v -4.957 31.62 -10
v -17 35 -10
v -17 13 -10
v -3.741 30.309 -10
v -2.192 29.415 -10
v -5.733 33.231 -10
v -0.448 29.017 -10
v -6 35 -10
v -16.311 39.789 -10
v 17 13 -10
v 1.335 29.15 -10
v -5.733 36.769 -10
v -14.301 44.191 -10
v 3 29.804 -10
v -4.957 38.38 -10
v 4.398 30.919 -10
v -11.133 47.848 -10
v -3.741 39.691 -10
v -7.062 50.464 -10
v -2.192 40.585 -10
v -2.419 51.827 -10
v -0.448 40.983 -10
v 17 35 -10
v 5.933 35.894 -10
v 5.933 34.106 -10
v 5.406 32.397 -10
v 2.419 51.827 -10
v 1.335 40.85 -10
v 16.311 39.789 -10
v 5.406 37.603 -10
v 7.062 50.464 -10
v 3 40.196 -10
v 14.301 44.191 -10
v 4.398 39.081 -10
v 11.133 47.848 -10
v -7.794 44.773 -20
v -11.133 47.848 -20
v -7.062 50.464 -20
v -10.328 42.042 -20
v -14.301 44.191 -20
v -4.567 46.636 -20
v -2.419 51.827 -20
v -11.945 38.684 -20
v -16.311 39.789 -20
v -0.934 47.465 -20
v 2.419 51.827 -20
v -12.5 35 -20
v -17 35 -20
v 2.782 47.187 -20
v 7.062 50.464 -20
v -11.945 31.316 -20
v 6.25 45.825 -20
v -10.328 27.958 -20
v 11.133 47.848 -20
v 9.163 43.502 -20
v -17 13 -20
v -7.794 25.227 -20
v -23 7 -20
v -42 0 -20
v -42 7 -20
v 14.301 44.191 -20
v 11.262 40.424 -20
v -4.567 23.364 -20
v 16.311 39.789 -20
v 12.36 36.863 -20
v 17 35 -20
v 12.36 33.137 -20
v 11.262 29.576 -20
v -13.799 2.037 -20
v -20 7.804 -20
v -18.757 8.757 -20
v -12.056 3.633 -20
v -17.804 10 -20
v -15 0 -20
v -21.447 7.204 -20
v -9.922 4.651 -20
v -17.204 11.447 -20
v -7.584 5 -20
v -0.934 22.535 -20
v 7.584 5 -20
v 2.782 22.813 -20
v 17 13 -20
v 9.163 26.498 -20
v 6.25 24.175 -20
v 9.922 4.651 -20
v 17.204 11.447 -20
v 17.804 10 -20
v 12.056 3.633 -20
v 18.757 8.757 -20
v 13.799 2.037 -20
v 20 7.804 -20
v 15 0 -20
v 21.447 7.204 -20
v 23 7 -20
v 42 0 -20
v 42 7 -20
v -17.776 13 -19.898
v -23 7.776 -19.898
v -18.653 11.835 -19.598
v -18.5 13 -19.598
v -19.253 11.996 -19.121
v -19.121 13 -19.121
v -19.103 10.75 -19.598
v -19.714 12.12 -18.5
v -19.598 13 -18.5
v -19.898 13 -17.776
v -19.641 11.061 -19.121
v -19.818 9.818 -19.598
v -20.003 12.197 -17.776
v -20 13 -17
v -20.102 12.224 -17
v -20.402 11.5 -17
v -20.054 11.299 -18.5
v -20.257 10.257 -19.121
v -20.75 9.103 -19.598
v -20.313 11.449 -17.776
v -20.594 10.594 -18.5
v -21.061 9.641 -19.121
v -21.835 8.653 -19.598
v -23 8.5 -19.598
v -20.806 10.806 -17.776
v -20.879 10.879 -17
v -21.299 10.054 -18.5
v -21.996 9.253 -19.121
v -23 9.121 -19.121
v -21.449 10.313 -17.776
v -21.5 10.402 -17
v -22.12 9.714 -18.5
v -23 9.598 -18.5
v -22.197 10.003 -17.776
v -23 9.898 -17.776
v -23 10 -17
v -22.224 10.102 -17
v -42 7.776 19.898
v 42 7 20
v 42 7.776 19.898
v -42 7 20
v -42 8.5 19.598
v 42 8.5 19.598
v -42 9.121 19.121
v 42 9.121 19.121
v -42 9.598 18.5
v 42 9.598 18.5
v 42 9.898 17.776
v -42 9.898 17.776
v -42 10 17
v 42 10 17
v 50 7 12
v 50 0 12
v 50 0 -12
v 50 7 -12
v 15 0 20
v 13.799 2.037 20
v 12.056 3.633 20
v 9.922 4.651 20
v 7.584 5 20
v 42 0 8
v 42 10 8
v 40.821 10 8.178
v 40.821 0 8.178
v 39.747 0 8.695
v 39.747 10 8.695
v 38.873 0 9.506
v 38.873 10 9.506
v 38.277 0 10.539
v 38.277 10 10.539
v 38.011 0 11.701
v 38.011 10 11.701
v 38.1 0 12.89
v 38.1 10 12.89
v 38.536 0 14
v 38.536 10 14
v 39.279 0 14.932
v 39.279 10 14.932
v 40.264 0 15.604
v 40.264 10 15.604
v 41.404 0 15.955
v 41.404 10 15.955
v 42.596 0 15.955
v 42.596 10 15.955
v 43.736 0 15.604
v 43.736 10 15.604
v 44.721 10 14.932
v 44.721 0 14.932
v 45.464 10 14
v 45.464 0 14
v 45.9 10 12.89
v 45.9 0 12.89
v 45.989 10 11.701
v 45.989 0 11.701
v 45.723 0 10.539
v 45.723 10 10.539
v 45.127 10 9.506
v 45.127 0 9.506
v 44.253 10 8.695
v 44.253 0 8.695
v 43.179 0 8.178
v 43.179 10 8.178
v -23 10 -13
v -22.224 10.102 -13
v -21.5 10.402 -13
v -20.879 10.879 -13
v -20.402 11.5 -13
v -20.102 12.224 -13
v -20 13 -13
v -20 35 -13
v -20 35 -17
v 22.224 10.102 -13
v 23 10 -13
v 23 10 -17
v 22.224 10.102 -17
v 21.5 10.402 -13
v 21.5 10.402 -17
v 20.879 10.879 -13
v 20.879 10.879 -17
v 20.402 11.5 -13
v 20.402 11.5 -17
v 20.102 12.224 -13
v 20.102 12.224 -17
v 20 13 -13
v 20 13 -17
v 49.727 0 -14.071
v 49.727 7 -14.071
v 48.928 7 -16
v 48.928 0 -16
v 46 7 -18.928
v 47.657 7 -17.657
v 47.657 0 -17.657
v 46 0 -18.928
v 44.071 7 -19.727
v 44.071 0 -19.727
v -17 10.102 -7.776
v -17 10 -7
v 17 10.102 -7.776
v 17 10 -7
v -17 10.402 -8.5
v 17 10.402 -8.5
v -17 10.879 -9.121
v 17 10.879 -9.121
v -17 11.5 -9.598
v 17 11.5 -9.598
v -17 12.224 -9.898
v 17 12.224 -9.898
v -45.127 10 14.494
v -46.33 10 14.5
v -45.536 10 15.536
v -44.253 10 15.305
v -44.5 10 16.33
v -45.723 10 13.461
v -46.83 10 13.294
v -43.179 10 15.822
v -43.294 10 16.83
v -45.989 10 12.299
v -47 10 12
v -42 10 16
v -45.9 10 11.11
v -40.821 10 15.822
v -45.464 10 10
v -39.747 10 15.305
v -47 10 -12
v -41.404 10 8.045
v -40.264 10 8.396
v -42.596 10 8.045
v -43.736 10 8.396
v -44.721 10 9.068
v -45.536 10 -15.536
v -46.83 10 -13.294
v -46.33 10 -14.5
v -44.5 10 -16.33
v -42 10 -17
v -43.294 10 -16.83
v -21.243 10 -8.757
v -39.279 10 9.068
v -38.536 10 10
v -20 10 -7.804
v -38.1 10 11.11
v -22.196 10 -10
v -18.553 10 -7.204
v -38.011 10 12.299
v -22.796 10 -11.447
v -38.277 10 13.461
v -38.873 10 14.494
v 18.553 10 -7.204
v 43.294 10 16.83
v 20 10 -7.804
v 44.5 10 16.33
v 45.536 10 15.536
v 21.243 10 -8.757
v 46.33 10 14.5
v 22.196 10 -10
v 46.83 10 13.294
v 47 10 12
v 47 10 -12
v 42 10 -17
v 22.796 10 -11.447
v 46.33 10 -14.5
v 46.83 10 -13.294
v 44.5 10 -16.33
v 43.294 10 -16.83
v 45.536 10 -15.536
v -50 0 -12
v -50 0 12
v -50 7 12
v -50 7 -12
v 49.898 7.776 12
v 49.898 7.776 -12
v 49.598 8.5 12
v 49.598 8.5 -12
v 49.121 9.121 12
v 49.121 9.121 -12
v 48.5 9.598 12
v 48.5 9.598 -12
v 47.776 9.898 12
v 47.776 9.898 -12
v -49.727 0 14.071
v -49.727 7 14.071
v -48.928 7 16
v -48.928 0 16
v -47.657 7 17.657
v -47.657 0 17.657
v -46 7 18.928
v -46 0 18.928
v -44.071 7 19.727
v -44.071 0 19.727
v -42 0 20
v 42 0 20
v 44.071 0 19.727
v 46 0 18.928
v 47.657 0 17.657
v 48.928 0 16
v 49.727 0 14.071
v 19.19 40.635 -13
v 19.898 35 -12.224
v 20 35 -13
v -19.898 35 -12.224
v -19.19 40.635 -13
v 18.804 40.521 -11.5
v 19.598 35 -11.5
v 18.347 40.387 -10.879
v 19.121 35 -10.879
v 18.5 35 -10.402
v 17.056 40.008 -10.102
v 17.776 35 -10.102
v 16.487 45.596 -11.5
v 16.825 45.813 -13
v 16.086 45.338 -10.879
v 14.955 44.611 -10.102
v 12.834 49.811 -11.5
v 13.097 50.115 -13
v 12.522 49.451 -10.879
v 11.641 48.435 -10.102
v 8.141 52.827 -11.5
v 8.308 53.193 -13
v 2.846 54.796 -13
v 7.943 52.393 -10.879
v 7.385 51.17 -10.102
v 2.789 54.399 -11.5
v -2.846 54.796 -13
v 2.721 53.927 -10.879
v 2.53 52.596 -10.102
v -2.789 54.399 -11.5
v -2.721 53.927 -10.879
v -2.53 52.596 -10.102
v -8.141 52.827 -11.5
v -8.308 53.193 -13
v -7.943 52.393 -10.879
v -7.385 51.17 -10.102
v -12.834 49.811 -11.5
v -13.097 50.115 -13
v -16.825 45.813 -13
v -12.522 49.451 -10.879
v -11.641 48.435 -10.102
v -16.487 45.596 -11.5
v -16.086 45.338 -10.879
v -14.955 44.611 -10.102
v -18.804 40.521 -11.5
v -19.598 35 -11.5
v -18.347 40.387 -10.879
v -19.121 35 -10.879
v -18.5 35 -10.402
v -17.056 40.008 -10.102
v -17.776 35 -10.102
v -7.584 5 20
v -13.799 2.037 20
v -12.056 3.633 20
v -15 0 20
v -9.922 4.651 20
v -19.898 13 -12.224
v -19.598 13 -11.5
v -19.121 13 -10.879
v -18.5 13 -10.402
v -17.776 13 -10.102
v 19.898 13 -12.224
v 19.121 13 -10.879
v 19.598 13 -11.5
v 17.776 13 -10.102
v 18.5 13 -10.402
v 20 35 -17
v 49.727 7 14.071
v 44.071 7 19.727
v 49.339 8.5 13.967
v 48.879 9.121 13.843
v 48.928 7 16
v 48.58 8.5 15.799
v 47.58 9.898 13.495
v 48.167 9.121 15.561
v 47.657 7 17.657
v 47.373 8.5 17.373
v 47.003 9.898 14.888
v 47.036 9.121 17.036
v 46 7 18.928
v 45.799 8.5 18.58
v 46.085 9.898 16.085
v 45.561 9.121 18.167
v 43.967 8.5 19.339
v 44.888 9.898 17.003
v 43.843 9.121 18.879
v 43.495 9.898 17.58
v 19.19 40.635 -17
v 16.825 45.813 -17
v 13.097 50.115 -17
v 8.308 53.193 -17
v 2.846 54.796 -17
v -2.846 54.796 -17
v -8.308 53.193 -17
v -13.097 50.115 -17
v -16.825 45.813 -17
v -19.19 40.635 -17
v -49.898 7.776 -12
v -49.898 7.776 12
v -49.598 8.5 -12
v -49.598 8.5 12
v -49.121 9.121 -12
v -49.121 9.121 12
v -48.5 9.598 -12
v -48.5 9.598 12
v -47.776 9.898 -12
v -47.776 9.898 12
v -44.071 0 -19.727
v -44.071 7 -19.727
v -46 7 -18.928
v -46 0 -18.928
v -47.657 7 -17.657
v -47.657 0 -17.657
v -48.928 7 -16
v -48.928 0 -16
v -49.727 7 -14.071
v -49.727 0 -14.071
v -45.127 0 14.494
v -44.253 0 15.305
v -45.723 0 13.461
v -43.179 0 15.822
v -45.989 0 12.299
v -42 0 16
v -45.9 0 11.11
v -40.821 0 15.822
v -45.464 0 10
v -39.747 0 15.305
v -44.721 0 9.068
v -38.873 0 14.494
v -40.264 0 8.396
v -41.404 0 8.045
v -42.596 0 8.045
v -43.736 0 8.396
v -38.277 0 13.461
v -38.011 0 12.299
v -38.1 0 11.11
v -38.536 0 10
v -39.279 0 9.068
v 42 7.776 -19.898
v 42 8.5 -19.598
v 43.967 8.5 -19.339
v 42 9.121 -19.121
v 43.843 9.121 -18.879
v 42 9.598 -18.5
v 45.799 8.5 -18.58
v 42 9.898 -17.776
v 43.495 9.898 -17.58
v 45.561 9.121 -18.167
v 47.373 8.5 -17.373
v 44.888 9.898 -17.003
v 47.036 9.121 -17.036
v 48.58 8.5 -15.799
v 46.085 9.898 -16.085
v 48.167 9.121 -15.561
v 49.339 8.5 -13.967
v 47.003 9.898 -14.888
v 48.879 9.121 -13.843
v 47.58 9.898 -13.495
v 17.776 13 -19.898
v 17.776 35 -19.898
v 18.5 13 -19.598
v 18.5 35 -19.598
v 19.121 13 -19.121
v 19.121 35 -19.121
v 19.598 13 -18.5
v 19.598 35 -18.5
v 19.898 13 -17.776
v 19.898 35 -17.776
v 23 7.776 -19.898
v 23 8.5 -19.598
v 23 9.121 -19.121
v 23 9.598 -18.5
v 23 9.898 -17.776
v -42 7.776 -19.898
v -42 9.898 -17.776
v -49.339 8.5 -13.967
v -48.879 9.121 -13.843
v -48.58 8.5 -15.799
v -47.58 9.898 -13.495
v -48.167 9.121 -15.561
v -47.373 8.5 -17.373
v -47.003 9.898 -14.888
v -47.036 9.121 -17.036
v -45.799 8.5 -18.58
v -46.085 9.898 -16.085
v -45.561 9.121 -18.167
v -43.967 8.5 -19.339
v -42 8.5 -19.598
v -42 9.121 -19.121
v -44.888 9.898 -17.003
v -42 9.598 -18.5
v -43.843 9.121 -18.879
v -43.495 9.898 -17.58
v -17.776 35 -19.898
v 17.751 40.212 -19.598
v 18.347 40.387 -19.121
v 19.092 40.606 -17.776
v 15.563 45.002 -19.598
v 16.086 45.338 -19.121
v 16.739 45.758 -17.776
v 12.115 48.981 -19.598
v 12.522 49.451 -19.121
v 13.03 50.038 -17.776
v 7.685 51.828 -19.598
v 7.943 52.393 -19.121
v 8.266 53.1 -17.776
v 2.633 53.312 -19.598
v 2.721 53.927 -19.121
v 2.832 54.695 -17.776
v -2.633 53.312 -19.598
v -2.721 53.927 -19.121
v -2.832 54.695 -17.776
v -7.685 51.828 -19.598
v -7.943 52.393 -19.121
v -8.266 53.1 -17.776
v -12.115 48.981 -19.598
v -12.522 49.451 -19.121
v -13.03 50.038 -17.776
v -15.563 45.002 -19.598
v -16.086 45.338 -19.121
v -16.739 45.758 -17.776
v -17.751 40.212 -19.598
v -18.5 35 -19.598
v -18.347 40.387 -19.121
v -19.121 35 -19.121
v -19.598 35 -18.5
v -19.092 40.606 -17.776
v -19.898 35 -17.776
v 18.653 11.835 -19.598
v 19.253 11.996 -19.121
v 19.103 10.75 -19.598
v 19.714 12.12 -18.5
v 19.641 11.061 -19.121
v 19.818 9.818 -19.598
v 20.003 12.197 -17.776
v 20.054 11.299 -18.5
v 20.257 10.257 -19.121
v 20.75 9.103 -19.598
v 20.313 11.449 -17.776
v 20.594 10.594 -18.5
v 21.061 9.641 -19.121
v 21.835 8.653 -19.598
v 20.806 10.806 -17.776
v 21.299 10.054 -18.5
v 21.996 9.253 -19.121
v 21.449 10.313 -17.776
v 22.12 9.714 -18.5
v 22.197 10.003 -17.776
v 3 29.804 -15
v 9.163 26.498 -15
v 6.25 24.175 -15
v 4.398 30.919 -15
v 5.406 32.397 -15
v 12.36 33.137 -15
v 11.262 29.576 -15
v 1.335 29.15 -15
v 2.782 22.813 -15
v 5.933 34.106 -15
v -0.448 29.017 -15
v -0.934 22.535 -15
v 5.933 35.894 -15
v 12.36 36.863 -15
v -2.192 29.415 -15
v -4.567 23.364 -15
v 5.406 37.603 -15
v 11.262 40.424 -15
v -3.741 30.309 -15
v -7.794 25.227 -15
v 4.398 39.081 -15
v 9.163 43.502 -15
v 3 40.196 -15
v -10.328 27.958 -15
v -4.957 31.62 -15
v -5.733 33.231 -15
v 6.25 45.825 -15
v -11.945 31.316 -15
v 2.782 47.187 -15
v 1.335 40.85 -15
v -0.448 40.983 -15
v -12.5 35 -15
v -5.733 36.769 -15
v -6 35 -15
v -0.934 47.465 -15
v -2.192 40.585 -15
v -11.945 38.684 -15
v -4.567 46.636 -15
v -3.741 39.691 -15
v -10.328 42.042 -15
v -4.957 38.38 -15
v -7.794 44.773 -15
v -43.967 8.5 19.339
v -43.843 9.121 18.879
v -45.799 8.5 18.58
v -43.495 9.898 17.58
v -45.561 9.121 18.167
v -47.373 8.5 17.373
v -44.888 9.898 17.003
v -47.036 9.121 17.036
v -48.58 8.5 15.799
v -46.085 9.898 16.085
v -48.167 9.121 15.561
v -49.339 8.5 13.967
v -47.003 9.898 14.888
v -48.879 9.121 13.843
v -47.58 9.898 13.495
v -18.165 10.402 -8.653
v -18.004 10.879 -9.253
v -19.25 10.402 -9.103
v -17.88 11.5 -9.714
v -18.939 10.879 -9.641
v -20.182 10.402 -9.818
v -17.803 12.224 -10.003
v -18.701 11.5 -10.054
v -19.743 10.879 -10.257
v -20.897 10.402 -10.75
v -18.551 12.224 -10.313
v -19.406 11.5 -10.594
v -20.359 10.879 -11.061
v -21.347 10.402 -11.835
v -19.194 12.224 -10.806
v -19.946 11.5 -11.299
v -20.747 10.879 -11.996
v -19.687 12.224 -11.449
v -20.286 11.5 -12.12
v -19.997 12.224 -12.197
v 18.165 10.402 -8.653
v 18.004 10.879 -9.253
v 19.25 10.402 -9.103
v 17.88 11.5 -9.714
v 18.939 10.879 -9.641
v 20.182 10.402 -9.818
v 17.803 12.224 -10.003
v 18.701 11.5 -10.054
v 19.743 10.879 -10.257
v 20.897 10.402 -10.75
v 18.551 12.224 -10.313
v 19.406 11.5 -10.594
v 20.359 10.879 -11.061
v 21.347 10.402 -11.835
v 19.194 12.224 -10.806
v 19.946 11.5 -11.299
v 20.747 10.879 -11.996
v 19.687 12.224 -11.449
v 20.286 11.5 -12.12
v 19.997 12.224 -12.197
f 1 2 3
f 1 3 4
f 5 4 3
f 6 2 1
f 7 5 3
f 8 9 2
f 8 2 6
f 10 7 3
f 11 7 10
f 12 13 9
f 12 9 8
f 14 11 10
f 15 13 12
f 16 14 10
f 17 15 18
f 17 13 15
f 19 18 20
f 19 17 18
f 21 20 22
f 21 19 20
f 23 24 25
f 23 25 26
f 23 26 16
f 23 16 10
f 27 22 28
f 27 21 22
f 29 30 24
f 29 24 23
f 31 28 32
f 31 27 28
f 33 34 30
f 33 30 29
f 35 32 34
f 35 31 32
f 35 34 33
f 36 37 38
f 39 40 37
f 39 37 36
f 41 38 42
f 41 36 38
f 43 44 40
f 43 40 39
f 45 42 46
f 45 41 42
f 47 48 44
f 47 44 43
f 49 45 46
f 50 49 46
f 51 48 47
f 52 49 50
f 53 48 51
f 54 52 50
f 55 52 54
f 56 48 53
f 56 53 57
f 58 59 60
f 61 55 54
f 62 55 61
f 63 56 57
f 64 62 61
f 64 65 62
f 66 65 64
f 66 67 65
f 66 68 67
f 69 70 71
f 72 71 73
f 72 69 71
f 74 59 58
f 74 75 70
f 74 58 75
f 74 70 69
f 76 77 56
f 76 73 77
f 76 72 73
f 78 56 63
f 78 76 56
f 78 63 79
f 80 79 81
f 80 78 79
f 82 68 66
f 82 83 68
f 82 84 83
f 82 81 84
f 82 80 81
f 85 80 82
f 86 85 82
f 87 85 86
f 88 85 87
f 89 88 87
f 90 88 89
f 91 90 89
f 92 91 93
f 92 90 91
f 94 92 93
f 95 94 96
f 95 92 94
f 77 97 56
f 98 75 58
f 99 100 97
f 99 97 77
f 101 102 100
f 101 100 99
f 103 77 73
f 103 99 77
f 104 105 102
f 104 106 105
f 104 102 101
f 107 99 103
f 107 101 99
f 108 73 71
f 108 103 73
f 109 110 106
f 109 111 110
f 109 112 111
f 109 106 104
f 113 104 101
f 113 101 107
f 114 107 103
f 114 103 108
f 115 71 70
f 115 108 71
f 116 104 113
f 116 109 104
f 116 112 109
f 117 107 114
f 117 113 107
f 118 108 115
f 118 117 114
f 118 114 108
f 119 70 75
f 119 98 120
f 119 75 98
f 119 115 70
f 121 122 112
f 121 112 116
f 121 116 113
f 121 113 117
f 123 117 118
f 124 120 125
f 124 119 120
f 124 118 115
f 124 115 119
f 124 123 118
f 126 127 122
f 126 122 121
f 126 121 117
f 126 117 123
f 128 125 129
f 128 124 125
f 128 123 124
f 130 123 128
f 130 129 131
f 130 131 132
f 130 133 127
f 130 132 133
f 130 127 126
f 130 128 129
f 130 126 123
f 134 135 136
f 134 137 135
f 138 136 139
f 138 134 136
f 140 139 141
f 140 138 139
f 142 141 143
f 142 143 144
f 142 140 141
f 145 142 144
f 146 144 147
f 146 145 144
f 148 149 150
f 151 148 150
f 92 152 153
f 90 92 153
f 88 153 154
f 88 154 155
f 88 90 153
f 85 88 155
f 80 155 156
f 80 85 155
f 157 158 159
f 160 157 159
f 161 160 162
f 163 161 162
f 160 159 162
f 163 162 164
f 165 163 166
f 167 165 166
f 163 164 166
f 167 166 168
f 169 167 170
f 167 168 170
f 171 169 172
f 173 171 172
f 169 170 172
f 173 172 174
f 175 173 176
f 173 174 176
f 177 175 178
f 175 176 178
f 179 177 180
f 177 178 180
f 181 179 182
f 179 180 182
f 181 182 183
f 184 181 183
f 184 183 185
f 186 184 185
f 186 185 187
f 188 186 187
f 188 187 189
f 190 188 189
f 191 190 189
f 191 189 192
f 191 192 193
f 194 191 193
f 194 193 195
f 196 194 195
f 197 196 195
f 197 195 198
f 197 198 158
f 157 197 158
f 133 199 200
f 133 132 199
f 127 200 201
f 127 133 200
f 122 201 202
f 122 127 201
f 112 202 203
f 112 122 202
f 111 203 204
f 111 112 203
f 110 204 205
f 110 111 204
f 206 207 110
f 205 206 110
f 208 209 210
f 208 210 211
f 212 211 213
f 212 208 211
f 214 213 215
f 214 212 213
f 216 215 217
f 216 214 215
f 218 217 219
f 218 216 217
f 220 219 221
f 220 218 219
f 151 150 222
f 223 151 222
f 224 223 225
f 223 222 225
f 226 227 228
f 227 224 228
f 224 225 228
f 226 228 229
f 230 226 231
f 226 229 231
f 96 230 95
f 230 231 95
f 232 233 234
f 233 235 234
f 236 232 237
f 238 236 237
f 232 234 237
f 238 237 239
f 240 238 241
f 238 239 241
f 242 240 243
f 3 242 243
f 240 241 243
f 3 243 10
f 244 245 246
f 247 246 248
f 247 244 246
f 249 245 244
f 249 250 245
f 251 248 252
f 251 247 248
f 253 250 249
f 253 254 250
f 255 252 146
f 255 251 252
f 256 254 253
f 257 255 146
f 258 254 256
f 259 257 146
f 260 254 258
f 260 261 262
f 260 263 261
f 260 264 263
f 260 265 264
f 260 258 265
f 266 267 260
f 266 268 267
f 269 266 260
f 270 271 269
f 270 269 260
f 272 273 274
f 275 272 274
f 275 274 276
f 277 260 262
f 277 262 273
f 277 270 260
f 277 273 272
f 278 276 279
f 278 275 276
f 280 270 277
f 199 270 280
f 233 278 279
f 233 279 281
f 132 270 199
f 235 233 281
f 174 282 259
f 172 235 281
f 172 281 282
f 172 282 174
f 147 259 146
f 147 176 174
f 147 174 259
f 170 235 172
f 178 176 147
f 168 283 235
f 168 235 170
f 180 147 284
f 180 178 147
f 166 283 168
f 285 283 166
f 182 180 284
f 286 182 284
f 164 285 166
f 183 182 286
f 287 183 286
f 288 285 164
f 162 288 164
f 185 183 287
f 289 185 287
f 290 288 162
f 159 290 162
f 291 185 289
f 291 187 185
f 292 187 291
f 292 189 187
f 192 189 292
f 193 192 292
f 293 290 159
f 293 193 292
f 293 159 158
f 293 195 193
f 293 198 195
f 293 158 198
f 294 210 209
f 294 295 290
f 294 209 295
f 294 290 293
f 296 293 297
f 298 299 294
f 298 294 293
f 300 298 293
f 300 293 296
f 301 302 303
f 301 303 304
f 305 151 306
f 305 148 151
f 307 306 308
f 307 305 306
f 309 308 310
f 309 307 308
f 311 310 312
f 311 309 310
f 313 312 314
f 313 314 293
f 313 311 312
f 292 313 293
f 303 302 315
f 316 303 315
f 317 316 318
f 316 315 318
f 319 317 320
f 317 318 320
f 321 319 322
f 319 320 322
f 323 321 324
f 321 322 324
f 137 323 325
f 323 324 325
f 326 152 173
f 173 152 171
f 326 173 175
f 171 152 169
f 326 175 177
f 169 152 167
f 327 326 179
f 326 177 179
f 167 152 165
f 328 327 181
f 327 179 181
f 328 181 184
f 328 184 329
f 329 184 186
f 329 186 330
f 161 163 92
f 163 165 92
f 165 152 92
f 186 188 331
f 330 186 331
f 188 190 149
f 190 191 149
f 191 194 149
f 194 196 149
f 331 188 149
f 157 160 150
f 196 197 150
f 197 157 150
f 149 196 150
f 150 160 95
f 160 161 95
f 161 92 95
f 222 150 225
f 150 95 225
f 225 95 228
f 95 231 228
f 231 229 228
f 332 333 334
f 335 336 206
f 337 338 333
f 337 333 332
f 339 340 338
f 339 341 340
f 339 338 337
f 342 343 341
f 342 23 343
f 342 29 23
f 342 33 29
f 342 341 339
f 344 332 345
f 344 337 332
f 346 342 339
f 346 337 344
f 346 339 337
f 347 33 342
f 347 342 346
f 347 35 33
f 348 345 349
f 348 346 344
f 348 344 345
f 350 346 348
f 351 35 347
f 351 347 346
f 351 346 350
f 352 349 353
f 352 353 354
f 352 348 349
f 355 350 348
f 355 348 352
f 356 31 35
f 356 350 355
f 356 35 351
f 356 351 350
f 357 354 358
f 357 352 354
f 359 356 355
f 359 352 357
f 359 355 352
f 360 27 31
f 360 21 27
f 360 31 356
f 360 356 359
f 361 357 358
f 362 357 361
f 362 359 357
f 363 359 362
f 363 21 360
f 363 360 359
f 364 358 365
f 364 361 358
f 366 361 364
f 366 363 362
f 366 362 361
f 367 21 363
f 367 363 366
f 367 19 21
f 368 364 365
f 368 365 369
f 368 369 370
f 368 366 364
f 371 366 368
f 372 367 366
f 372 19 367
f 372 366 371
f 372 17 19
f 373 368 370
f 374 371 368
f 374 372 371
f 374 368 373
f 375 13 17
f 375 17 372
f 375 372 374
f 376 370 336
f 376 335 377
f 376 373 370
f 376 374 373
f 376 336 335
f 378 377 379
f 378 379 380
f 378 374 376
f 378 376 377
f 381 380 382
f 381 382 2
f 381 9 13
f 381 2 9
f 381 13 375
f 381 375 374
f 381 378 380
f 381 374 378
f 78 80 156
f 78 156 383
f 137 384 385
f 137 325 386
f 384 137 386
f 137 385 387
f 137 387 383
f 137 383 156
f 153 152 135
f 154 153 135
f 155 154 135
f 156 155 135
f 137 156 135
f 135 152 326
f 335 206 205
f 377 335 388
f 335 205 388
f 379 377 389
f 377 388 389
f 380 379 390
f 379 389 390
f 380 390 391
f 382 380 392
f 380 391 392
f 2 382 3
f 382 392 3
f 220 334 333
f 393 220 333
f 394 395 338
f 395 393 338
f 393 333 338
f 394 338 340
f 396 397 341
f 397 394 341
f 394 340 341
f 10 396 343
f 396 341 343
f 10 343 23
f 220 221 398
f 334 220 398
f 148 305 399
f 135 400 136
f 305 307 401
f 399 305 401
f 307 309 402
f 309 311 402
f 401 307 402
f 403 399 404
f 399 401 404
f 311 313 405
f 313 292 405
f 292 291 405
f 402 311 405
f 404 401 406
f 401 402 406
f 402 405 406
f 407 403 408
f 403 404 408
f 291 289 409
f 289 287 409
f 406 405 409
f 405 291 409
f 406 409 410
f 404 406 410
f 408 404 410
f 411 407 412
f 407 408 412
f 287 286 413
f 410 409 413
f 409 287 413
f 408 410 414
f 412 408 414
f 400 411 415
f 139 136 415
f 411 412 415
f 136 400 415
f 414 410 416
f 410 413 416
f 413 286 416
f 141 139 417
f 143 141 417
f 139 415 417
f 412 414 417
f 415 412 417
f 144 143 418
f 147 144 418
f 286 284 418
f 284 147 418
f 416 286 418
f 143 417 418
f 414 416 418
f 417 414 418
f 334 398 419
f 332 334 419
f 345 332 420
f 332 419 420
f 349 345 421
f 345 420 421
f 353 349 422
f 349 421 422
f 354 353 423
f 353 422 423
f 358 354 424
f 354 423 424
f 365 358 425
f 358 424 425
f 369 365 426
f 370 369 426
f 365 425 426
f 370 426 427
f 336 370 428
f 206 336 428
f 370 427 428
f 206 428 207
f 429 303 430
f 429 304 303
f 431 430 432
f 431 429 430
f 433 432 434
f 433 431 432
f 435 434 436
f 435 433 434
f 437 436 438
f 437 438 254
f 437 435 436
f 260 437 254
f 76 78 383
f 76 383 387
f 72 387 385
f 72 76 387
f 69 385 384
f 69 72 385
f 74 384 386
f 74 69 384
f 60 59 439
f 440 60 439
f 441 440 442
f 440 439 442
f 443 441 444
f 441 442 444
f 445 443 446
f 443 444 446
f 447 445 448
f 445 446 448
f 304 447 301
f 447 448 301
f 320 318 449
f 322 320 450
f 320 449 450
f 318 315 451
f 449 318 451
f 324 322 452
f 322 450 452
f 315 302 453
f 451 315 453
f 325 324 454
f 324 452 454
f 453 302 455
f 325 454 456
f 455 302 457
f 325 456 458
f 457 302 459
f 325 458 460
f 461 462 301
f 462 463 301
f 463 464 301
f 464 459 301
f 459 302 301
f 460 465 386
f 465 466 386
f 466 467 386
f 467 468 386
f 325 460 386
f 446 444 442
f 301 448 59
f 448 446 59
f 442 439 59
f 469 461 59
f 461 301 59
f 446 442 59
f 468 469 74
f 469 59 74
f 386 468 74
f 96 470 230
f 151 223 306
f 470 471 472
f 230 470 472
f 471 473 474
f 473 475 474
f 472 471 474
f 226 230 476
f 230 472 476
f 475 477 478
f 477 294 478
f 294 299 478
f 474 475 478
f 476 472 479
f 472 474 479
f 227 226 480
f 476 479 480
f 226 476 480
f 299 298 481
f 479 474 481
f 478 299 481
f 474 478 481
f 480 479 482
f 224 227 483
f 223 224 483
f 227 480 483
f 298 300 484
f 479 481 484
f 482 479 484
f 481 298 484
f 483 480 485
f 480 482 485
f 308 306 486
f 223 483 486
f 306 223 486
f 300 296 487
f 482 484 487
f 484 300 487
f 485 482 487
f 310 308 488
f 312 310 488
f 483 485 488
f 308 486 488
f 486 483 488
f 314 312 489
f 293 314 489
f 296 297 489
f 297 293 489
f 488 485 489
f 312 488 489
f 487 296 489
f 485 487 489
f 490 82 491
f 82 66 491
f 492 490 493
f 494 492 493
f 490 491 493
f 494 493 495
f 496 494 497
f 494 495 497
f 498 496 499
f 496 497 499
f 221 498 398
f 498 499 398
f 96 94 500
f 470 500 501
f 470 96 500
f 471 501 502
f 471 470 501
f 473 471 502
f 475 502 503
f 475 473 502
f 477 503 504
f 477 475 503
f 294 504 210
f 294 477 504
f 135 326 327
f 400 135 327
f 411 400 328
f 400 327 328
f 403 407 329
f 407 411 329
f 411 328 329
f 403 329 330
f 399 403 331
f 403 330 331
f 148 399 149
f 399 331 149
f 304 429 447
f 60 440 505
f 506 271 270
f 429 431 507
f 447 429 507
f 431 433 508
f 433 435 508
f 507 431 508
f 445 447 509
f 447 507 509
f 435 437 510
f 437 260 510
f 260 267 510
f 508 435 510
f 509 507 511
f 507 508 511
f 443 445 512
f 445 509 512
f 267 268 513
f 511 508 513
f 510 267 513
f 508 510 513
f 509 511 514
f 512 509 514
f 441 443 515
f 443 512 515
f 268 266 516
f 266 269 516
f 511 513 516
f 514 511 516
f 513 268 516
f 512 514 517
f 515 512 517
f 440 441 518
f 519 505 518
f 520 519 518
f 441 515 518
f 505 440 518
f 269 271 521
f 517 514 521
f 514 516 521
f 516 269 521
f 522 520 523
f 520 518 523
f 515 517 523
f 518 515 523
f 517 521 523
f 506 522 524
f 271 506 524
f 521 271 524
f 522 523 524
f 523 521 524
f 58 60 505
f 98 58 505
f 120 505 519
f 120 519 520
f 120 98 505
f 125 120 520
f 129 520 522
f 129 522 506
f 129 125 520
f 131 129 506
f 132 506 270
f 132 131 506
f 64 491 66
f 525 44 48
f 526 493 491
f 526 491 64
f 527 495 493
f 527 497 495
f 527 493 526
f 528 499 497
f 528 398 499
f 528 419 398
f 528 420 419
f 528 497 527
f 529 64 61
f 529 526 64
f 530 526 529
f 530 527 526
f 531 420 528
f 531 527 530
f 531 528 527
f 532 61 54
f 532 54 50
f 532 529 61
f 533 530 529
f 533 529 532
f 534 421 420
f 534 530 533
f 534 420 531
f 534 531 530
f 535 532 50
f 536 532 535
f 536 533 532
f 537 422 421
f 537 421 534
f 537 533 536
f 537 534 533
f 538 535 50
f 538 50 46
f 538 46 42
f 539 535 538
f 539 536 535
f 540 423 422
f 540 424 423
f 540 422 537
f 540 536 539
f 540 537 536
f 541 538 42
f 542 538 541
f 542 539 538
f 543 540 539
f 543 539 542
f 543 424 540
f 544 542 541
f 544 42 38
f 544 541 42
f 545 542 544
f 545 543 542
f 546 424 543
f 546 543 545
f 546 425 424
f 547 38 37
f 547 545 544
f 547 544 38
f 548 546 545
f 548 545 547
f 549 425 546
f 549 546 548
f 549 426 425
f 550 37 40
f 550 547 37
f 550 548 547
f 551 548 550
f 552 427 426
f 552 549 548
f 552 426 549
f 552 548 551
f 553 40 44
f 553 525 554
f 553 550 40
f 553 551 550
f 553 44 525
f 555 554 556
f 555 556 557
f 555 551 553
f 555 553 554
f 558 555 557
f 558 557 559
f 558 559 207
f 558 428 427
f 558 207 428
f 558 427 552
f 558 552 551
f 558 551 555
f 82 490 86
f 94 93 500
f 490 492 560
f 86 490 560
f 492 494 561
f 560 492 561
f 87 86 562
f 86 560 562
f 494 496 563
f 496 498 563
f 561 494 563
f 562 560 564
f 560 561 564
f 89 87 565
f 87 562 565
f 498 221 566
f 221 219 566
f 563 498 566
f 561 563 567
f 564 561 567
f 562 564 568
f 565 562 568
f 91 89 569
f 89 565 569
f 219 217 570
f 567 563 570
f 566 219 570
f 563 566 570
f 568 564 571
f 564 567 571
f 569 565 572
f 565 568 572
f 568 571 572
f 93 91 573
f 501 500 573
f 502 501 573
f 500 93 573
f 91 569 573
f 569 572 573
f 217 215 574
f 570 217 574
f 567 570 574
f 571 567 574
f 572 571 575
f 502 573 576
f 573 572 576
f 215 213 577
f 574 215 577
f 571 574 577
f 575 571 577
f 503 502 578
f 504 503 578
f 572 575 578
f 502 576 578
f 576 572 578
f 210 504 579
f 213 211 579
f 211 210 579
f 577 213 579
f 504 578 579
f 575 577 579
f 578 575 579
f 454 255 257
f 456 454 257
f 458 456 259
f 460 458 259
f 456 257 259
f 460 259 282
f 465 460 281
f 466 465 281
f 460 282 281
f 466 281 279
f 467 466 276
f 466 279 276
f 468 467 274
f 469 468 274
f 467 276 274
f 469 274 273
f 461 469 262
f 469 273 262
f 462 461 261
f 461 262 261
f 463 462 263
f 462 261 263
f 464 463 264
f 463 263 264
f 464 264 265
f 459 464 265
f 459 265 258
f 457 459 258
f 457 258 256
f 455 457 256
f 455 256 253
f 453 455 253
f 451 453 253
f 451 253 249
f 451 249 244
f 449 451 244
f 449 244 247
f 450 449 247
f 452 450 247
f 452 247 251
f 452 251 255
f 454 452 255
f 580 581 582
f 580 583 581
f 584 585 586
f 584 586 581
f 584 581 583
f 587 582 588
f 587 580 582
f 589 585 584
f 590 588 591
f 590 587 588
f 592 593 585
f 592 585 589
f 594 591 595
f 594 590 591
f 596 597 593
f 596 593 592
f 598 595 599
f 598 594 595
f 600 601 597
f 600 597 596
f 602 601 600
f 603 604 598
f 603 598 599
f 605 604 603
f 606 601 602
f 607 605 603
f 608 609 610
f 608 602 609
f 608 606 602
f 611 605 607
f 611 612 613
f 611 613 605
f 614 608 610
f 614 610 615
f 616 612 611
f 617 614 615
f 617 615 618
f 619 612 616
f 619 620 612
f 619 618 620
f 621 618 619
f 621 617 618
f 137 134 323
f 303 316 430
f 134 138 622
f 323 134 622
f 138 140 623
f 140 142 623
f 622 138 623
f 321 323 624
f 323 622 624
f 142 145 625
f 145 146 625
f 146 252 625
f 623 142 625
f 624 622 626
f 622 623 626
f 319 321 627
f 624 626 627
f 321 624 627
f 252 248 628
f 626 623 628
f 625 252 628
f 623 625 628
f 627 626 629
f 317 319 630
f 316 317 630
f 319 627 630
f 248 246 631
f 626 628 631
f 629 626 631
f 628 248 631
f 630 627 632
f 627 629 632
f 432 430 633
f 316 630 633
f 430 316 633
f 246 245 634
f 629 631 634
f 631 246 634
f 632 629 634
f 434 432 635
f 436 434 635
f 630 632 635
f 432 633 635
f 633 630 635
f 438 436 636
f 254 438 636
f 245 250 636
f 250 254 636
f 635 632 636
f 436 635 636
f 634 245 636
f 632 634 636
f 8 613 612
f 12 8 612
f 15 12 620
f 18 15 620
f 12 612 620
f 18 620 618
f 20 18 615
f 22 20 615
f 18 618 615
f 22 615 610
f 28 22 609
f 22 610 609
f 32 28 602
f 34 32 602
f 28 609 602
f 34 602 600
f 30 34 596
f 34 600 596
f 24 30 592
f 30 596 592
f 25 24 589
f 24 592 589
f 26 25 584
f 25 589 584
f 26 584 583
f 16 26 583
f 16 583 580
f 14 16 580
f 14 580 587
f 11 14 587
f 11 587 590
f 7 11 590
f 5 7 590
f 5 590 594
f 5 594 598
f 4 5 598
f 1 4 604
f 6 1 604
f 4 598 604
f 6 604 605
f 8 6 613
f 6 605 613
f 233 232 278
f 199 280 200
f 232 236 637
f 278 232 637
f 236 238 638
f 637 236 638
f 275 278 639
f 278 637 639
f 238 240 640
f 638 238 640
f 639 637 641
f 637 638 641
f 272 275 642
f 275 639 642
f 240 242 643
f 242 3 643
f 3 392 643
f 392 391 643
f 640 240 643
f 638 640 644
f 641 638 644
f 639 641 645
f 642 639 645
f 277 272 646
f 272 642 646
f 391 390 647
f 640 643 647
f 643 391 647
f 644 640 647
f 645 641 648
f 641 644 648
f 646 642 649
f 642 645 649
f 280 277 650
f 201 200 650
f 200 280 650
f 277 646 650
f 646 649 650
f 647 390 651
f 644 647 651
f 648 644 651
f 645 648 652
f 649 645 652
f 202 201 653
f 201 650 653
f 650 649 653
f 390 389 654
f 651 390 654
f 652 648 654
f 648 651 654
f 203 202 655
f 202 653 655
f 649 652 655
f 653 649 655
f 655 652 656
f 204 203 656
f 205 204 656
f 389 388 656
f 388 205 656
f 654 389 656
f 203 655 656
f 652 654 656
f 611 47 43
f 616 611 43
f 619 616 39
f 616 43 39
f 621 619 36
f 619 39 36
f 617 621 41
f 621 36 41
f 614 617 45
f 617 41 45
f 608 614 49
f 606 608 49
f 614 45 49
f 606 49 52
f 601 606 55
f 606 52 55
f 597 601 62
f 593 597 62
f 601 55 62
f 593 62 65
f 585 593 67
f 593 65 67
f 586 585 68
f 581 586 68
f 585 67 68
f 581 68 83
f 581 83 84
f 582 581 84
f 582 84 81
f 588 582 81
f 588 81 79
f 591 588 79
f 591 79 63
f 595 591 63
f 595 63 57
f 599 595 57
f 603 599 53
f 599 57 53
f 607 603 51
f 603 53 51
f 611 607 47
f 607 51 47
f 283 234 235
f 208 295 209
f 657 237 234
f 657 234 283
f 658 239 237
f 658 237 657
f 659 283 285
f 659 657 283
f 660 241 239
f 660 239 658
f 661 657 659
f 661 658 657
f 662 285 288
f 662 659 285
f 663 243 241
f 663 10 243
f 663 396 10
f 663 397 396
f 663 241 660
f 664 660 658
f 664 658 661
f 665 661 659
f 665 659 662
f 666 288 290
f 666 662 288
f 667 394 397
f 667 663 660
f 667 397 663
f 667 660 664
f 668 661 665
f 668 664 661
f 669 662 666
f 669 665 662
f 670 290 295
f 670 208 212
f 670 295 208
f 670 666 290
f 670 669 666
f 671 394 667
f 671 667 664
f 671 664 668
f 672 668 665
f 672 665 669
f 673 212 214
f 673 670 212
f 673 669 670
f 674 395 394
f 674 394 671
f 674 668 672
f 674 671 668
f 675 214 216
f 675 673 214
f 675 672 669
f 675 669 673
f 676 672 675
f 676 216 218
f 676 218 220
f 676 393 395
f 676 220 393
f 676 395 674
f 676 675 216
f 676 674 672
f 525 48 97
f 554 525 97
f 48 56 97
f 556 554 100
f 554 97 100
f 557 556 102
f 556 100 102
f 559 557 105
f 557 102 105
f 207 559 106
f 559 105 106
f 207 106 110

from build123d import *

# Parameters (mm, degrees)
SKETCH_3_W          = 100
SKETCH_3_H          = 40
EXTRUDE_1_DEPTH     = 10
EXTRUDE_3_DEPTH     = 10
SKETCH_6_R          = 12.5
CUT_EXTRUDE_1_DEPTH = 5
SKETCH_8_R          = 6
CUT_EXTRUDE_2_DEPTH = 5
SKETCH_9_W          = 30
SKETCH_9_H          = 5
CUT_EXTRUDE_4_DEPTH = 85.409715081
FILLET_1_R          = 8
SKETCH_12_R         = 4
CUT_EXTRUDE_6_DEPTH = 71.178344238
FILLET_2_R          = 3


with BuildPart() as part:
    # Эскиз3 → Бобышка-Вытянуть1 (new body)
    with BuildSketch(Plane(origin=(0, 0, 0), x_dir=(1, 0, 0), z_dir=(0, 1, 0))):
        Rectangle(SKETCH_3_W, SKETCH_3_H)
    extrude(amount=EXTRUDE_1_DEPTH)

    # Эскиз4 → Бобышка-Вытянуть3 (add)
    with BuildSketch(Plane(origin=(0, 0, -20), x_dir=(-1, 0, 0), z_dir=(0, 0, -1))):
        with BuildLine():
            Line((-20, 0), (-20, 35))
            ThreePointArc((-20, 35), (0, 55), (20, 35))
            Line((20, 35), (20, 0))
            Line((20, 0), (-20, 0))
        make_face()
    extrude(amount=-EXTRUDE_3_DEPTH)

    # Эскиз6 → Вырез-Вытянуть1 (cut)
    with BuildSketch(Plane(origin=(0, 0, -20), x_dir=(-1, 0, 0), z_dir=(0, 0, -1))):
        with Locations((0, 35)):
            Circle(SKETCH_6_R)
    extrude(amount=-CUT_EXTRUDE_1_DEPTH, mode=Mode.SUBTRACT)

    # Эскиз8 → Вырез-Вытянуть2 (cut)
    with BuildSketch(Plane(origin=(0, 0, -15), x_dir=(-1, 0, 0), z_dir=(0, 0, -1))):
        with Locations((0, 35)):
            Circle(SKETCH_8_R)
    extrude(amount=-CUT_EXTRUDE_2_DEPTH, mode=Mode.SUBTRACT)

    # Эскиз9 → Вырез-Вытянуть4 (cut, through all)
    with BuildSketch(Plane(origin=(0, 0, -20), x_dir=(-1, 0, 0), z_dir=(0, 0, -1))):
        with Locations((0, 2.5)):
            Rectangle(SKETCH_9_W, SKETCH_9_H)
    extrude(amount=-CUT_EXTRUDE_4_DEPTH, mode=Mode.SUBTRACT)

    # Скругление1
    # the kernel refuses this fillet: 8 mm, written as the material it adds along each edge
    with BuildSketch(Plane(origin=(-15, 5, -20), x_dir=(0, -1, 0), z_dir=(0, 0, 1))) as fillet_1_piece_1:
        with BuildLine():
            CenterArc((8, 7.416198487), FILLET_1_R, 180, 67.975687163)
            Line((0, 7.416198487), (0, 0))
            Line((0, 0), (5, 0))
        make_face()
    extrude(amount=40)
    with BuildSketch(Plane(origin=(15, 5, -20), x_dir=(-1, 0, 0), z_dir=(0, 0, 1))) as fillet_1_piece_2:
        with BuildLine():
            CenterArc((7.416198487, 8), FILLET_1_R, 202.024312837, 67.975687163)
            Line((0, 5), (0, 0))
            Line((0, 0), (7.416198487, 0))
        make_face()
    extrude(amount=40)
    # the kernel refuses this fillet: 8 mm, written as the material it takes off along each edge
    with BuildSketch(Plane(origin=(-50, -20, 20), x_dir=(0, 0, -1), z_dir=(0, 1, 0)), Plane(origin=(-50, -20, -20), x_dir=(1, 0, 0), z_dir=(0, 1, 0))) as fillet_1_2_piece_1:
        with BuildLine():
            CenterArc((FILLET_1_R, -FILLET_1_R), FILLET_1_R, 90, 90)
            Line((0, -FILLET_1_R), (0, 0))
            Line((0, 0), (FILLET_1_R, 0))
        make_face()
    extrude(amount=50, mode=Mode.SUBTRACT)
    with BuildSketch(Plane(origin=(50, -20, 20), x_dir=(0, 0, -1), z_dir=(0, 1, 0)), Plane(origin=(50, -20, -20), x_dir=(-1, 0, 0), z_dir=(0, 1, 0))) as fillet_1_2_piece_2:
        with BuildLine():
            CenterArc((FILLET_1_R, FILLET_1_R), FILLET_1_R, 180, 90)
            Line((0, FILLET_1_R), (0, 0))
            Line((0, 0), (FILLET_1_R, 0))
        make_face()
    extrude(amount=50, mode=Mode.SUBTRACT)

    # Эскиз12 → Вырез-Вытянуть6 (cut, through all)
    with BuildSketch(Plane(origin=(0, 10, 0), x_dir=(1, 0, 0), z_dir=(0, 1, 0))):
        with Locations(Location((-42, -12, 0), (0, 0, 270))):
            Circle(SKETCH_12_R)
        with Locations(Location((42, -12, 0), (0, 0, 90))):
            Circle(SKETCH_12_R)
    extrude(amount=-CUT_EXTRUDE_6_DEPTH, mode=Mode.SUBTRACT)

    # Скругление2
    fillet_2_edges = [part.edges().sort_by_distance(p)[0] for p in [
        (31, 10, -20),
        (20, 10, -15),
        (-20, 10, -15),
        (20, 22.5, -20),
        (0, 55, -20),
        (-20, 22.5, -20),
        (-20, 22.5, -10),
        (0, 10, -10),
        (20, 22.5, -10),
        (0, 55, -10),
        (0, 10, 20),
        (-50, 10, 0),
        (-31, 10, -20),
        (50, 10, 0),
        (47.656854249, 10, -17.656854249),
        (47.656854249, 10, 17.656854249),
        (-47.656854249, 10, -17.656854249),
        (-47.656854249, 10, 17.656854249),
    ]]
    fillet(fillet_2_edges, radius=FILLET_2_R)


solid = part.part
